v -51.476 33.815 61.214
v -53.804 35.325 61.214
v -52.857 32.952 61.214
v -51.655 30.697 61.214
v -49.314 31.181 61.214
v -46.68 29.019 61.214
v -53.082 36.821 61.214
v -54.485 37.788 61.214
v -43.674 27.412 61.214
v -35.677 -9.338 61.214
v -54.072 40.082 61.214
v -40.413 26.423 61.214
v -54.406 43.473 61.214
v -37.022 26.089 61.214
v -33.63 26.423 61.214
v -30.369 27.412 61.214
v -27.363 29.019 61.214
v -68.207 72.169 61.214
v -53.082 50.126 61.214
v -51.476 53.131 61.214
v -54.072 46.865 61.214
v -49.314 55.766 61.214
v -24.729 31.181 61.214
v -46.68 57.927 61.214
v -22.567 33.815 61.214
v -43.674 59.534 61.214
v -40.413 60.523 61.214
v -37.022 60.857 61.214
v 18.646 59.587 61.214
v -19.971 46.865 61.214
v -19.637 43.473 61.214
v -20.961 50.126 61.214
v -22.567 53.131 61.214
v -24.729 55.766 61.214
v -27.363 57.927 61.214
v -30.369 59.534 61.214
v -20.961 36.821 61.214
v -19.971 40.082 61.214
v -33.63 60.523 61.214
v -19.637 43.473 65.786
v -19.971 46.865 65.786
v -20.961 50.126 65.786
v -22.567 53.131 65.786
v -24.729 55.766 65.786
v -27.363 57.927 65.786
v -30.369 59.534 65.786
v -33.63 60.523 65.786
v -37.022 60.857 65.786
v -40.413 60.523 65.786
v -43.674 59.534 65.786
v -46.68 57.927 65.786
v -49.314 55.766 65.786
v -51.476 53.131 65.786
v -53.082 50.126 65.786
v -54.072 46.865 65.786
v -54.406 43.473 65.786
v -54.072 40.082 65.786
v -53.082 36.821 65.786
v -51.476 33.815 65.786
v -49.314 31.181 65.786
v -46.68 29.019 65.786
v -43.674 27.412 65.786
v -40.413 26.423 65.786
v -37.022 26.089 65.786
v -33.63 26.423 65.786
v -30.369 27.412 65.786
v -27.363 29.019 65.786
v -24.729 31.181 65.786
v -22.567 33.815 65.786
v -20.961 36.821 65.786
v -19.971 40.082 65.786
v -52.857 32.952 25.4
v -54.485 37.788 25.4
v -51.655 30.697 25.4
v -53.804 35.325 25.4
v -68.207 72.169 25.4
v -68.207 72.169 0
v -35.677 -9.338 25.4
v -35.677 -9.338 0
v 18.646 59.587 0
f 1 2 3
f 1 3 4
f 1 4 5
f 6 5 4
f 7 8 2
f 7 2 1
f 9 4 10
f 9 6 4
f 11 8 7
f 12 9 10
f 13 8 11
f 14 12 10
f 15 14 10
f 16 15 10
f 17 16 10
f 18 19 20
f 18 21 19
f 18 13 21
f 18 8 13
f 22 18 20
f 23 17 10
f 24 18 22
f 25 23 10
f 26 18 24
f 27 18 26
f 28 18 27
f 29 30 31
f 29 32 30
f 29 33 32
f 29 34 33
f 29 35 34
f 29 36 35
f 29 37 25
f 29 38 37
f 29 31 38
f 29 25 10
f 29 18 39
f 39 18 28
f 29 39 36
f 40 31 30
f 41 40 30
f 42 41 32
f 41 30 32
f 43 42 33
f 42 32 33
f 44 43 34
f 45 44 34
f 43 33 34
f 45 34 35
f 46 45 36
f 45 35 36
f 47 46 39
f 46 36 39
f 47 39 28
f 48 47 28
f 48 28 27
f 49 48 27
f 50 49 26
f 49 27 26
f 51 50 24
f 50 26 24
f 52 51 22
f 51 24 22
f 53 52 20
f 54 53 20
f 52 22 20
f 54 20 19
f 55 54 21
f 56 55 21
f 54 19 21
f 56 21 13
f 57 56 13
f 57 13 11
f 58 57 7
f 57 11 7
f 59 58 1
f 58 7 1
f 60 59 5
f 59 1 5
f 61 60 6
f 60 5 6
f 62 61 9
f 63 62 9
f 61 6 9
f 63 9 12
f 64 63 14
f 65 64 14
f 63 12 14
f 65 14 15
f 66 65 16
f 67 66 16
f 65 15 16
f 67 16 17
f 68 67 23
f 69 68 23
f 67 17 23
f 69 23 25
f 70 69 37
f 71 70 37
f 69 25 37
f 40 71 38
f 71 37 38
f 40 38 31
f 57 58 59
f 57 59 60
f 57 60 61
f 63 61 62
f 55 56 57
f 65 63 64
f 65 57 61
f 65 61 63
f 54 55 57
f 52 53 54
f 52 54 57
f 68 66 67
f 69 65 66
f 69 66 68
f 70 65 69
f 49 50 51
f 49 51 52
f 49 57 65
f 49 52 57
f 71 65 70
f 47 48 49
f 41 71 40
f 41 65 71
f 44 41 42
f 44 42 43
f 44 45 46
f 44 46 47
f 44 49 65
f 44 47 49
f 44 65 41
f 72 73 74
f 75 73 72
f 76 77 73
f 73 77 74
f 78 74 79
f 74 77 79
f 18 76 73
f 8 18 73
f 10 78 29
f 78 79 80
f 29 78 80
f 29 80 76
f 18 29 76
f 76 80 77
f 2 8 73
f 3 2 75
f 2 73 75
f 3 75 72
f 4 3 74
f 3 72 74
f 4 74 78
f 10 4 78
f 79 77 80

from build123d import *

# Parameters (mm, degrees)
F1_DEPTH = 25.4
F3_DEPTH = 35.814
F4_R     = 17.384083
F5_DEPTH = 4.572


with BuildPart() as f1:
    # F0 (on Top) → F1 (new body)
    with BuildSketch(Plane.XY):
        Polygon((-35.676657, -9.338491), (18.646077, 59.587132), (-68.206631, 72.169188), align=None)
    extrude(amount=F1_DEPTH)

    # F2 (on face) → F3 (join)
    with BuildSketch(Plane.XY.offset(25.4)):
        with BuildLine():
            Line((-51.654875, 30.696816), (-54.485089, 37.788251))
            ThreePointArc((-54.485089, 37.788251), (-53.363226, 34.125499), (-51.654875, 30.696816))
        make_face()
        with BuildLine():
            ThreePointArc((-54.485089, 37.788251), (-34.270187, 65.84384), (-8.542018, 42.739302))
            ThreePointArc((-8.542018, 42.739302), (-25.528601, 20.357725), (-51.654875, 30.696816))
            Line((-51.654875, 30.696816), (-35.676657, -9.338491))
            Line((-35.676657, -9.338491), (18.646077, 59.587132))
            Line((18.646077, 59.587132), (-68.206631, 72.169188))
            Line((-68.206631, 72.169188), (-54.485089, 37.788251))
        make_face()
        with BuildLine():
            ThreePointArc((-51.654875, 30.696816), (-25.528601, 20.357725), (-8.542018, 42.739302))
            ThreePointArc((-8.542018, 42.739302), (-34.270187, 65.84384), (-54.485089, 37.788251))
            Line((-54.485089, 37.788251), (-51.654875, 30.696816))
        make_face()
    extrude(amount=F3_DEPTH)

    # F4 (on face) → F5 (join)
    with BuildSketch(Plane.XY.offset(61.214)):
        with Locations((-37.021548, 43.473128)):
            Circle(F4_R)
    extrude(amount=F5_DEPTH)


solid = f1.part
